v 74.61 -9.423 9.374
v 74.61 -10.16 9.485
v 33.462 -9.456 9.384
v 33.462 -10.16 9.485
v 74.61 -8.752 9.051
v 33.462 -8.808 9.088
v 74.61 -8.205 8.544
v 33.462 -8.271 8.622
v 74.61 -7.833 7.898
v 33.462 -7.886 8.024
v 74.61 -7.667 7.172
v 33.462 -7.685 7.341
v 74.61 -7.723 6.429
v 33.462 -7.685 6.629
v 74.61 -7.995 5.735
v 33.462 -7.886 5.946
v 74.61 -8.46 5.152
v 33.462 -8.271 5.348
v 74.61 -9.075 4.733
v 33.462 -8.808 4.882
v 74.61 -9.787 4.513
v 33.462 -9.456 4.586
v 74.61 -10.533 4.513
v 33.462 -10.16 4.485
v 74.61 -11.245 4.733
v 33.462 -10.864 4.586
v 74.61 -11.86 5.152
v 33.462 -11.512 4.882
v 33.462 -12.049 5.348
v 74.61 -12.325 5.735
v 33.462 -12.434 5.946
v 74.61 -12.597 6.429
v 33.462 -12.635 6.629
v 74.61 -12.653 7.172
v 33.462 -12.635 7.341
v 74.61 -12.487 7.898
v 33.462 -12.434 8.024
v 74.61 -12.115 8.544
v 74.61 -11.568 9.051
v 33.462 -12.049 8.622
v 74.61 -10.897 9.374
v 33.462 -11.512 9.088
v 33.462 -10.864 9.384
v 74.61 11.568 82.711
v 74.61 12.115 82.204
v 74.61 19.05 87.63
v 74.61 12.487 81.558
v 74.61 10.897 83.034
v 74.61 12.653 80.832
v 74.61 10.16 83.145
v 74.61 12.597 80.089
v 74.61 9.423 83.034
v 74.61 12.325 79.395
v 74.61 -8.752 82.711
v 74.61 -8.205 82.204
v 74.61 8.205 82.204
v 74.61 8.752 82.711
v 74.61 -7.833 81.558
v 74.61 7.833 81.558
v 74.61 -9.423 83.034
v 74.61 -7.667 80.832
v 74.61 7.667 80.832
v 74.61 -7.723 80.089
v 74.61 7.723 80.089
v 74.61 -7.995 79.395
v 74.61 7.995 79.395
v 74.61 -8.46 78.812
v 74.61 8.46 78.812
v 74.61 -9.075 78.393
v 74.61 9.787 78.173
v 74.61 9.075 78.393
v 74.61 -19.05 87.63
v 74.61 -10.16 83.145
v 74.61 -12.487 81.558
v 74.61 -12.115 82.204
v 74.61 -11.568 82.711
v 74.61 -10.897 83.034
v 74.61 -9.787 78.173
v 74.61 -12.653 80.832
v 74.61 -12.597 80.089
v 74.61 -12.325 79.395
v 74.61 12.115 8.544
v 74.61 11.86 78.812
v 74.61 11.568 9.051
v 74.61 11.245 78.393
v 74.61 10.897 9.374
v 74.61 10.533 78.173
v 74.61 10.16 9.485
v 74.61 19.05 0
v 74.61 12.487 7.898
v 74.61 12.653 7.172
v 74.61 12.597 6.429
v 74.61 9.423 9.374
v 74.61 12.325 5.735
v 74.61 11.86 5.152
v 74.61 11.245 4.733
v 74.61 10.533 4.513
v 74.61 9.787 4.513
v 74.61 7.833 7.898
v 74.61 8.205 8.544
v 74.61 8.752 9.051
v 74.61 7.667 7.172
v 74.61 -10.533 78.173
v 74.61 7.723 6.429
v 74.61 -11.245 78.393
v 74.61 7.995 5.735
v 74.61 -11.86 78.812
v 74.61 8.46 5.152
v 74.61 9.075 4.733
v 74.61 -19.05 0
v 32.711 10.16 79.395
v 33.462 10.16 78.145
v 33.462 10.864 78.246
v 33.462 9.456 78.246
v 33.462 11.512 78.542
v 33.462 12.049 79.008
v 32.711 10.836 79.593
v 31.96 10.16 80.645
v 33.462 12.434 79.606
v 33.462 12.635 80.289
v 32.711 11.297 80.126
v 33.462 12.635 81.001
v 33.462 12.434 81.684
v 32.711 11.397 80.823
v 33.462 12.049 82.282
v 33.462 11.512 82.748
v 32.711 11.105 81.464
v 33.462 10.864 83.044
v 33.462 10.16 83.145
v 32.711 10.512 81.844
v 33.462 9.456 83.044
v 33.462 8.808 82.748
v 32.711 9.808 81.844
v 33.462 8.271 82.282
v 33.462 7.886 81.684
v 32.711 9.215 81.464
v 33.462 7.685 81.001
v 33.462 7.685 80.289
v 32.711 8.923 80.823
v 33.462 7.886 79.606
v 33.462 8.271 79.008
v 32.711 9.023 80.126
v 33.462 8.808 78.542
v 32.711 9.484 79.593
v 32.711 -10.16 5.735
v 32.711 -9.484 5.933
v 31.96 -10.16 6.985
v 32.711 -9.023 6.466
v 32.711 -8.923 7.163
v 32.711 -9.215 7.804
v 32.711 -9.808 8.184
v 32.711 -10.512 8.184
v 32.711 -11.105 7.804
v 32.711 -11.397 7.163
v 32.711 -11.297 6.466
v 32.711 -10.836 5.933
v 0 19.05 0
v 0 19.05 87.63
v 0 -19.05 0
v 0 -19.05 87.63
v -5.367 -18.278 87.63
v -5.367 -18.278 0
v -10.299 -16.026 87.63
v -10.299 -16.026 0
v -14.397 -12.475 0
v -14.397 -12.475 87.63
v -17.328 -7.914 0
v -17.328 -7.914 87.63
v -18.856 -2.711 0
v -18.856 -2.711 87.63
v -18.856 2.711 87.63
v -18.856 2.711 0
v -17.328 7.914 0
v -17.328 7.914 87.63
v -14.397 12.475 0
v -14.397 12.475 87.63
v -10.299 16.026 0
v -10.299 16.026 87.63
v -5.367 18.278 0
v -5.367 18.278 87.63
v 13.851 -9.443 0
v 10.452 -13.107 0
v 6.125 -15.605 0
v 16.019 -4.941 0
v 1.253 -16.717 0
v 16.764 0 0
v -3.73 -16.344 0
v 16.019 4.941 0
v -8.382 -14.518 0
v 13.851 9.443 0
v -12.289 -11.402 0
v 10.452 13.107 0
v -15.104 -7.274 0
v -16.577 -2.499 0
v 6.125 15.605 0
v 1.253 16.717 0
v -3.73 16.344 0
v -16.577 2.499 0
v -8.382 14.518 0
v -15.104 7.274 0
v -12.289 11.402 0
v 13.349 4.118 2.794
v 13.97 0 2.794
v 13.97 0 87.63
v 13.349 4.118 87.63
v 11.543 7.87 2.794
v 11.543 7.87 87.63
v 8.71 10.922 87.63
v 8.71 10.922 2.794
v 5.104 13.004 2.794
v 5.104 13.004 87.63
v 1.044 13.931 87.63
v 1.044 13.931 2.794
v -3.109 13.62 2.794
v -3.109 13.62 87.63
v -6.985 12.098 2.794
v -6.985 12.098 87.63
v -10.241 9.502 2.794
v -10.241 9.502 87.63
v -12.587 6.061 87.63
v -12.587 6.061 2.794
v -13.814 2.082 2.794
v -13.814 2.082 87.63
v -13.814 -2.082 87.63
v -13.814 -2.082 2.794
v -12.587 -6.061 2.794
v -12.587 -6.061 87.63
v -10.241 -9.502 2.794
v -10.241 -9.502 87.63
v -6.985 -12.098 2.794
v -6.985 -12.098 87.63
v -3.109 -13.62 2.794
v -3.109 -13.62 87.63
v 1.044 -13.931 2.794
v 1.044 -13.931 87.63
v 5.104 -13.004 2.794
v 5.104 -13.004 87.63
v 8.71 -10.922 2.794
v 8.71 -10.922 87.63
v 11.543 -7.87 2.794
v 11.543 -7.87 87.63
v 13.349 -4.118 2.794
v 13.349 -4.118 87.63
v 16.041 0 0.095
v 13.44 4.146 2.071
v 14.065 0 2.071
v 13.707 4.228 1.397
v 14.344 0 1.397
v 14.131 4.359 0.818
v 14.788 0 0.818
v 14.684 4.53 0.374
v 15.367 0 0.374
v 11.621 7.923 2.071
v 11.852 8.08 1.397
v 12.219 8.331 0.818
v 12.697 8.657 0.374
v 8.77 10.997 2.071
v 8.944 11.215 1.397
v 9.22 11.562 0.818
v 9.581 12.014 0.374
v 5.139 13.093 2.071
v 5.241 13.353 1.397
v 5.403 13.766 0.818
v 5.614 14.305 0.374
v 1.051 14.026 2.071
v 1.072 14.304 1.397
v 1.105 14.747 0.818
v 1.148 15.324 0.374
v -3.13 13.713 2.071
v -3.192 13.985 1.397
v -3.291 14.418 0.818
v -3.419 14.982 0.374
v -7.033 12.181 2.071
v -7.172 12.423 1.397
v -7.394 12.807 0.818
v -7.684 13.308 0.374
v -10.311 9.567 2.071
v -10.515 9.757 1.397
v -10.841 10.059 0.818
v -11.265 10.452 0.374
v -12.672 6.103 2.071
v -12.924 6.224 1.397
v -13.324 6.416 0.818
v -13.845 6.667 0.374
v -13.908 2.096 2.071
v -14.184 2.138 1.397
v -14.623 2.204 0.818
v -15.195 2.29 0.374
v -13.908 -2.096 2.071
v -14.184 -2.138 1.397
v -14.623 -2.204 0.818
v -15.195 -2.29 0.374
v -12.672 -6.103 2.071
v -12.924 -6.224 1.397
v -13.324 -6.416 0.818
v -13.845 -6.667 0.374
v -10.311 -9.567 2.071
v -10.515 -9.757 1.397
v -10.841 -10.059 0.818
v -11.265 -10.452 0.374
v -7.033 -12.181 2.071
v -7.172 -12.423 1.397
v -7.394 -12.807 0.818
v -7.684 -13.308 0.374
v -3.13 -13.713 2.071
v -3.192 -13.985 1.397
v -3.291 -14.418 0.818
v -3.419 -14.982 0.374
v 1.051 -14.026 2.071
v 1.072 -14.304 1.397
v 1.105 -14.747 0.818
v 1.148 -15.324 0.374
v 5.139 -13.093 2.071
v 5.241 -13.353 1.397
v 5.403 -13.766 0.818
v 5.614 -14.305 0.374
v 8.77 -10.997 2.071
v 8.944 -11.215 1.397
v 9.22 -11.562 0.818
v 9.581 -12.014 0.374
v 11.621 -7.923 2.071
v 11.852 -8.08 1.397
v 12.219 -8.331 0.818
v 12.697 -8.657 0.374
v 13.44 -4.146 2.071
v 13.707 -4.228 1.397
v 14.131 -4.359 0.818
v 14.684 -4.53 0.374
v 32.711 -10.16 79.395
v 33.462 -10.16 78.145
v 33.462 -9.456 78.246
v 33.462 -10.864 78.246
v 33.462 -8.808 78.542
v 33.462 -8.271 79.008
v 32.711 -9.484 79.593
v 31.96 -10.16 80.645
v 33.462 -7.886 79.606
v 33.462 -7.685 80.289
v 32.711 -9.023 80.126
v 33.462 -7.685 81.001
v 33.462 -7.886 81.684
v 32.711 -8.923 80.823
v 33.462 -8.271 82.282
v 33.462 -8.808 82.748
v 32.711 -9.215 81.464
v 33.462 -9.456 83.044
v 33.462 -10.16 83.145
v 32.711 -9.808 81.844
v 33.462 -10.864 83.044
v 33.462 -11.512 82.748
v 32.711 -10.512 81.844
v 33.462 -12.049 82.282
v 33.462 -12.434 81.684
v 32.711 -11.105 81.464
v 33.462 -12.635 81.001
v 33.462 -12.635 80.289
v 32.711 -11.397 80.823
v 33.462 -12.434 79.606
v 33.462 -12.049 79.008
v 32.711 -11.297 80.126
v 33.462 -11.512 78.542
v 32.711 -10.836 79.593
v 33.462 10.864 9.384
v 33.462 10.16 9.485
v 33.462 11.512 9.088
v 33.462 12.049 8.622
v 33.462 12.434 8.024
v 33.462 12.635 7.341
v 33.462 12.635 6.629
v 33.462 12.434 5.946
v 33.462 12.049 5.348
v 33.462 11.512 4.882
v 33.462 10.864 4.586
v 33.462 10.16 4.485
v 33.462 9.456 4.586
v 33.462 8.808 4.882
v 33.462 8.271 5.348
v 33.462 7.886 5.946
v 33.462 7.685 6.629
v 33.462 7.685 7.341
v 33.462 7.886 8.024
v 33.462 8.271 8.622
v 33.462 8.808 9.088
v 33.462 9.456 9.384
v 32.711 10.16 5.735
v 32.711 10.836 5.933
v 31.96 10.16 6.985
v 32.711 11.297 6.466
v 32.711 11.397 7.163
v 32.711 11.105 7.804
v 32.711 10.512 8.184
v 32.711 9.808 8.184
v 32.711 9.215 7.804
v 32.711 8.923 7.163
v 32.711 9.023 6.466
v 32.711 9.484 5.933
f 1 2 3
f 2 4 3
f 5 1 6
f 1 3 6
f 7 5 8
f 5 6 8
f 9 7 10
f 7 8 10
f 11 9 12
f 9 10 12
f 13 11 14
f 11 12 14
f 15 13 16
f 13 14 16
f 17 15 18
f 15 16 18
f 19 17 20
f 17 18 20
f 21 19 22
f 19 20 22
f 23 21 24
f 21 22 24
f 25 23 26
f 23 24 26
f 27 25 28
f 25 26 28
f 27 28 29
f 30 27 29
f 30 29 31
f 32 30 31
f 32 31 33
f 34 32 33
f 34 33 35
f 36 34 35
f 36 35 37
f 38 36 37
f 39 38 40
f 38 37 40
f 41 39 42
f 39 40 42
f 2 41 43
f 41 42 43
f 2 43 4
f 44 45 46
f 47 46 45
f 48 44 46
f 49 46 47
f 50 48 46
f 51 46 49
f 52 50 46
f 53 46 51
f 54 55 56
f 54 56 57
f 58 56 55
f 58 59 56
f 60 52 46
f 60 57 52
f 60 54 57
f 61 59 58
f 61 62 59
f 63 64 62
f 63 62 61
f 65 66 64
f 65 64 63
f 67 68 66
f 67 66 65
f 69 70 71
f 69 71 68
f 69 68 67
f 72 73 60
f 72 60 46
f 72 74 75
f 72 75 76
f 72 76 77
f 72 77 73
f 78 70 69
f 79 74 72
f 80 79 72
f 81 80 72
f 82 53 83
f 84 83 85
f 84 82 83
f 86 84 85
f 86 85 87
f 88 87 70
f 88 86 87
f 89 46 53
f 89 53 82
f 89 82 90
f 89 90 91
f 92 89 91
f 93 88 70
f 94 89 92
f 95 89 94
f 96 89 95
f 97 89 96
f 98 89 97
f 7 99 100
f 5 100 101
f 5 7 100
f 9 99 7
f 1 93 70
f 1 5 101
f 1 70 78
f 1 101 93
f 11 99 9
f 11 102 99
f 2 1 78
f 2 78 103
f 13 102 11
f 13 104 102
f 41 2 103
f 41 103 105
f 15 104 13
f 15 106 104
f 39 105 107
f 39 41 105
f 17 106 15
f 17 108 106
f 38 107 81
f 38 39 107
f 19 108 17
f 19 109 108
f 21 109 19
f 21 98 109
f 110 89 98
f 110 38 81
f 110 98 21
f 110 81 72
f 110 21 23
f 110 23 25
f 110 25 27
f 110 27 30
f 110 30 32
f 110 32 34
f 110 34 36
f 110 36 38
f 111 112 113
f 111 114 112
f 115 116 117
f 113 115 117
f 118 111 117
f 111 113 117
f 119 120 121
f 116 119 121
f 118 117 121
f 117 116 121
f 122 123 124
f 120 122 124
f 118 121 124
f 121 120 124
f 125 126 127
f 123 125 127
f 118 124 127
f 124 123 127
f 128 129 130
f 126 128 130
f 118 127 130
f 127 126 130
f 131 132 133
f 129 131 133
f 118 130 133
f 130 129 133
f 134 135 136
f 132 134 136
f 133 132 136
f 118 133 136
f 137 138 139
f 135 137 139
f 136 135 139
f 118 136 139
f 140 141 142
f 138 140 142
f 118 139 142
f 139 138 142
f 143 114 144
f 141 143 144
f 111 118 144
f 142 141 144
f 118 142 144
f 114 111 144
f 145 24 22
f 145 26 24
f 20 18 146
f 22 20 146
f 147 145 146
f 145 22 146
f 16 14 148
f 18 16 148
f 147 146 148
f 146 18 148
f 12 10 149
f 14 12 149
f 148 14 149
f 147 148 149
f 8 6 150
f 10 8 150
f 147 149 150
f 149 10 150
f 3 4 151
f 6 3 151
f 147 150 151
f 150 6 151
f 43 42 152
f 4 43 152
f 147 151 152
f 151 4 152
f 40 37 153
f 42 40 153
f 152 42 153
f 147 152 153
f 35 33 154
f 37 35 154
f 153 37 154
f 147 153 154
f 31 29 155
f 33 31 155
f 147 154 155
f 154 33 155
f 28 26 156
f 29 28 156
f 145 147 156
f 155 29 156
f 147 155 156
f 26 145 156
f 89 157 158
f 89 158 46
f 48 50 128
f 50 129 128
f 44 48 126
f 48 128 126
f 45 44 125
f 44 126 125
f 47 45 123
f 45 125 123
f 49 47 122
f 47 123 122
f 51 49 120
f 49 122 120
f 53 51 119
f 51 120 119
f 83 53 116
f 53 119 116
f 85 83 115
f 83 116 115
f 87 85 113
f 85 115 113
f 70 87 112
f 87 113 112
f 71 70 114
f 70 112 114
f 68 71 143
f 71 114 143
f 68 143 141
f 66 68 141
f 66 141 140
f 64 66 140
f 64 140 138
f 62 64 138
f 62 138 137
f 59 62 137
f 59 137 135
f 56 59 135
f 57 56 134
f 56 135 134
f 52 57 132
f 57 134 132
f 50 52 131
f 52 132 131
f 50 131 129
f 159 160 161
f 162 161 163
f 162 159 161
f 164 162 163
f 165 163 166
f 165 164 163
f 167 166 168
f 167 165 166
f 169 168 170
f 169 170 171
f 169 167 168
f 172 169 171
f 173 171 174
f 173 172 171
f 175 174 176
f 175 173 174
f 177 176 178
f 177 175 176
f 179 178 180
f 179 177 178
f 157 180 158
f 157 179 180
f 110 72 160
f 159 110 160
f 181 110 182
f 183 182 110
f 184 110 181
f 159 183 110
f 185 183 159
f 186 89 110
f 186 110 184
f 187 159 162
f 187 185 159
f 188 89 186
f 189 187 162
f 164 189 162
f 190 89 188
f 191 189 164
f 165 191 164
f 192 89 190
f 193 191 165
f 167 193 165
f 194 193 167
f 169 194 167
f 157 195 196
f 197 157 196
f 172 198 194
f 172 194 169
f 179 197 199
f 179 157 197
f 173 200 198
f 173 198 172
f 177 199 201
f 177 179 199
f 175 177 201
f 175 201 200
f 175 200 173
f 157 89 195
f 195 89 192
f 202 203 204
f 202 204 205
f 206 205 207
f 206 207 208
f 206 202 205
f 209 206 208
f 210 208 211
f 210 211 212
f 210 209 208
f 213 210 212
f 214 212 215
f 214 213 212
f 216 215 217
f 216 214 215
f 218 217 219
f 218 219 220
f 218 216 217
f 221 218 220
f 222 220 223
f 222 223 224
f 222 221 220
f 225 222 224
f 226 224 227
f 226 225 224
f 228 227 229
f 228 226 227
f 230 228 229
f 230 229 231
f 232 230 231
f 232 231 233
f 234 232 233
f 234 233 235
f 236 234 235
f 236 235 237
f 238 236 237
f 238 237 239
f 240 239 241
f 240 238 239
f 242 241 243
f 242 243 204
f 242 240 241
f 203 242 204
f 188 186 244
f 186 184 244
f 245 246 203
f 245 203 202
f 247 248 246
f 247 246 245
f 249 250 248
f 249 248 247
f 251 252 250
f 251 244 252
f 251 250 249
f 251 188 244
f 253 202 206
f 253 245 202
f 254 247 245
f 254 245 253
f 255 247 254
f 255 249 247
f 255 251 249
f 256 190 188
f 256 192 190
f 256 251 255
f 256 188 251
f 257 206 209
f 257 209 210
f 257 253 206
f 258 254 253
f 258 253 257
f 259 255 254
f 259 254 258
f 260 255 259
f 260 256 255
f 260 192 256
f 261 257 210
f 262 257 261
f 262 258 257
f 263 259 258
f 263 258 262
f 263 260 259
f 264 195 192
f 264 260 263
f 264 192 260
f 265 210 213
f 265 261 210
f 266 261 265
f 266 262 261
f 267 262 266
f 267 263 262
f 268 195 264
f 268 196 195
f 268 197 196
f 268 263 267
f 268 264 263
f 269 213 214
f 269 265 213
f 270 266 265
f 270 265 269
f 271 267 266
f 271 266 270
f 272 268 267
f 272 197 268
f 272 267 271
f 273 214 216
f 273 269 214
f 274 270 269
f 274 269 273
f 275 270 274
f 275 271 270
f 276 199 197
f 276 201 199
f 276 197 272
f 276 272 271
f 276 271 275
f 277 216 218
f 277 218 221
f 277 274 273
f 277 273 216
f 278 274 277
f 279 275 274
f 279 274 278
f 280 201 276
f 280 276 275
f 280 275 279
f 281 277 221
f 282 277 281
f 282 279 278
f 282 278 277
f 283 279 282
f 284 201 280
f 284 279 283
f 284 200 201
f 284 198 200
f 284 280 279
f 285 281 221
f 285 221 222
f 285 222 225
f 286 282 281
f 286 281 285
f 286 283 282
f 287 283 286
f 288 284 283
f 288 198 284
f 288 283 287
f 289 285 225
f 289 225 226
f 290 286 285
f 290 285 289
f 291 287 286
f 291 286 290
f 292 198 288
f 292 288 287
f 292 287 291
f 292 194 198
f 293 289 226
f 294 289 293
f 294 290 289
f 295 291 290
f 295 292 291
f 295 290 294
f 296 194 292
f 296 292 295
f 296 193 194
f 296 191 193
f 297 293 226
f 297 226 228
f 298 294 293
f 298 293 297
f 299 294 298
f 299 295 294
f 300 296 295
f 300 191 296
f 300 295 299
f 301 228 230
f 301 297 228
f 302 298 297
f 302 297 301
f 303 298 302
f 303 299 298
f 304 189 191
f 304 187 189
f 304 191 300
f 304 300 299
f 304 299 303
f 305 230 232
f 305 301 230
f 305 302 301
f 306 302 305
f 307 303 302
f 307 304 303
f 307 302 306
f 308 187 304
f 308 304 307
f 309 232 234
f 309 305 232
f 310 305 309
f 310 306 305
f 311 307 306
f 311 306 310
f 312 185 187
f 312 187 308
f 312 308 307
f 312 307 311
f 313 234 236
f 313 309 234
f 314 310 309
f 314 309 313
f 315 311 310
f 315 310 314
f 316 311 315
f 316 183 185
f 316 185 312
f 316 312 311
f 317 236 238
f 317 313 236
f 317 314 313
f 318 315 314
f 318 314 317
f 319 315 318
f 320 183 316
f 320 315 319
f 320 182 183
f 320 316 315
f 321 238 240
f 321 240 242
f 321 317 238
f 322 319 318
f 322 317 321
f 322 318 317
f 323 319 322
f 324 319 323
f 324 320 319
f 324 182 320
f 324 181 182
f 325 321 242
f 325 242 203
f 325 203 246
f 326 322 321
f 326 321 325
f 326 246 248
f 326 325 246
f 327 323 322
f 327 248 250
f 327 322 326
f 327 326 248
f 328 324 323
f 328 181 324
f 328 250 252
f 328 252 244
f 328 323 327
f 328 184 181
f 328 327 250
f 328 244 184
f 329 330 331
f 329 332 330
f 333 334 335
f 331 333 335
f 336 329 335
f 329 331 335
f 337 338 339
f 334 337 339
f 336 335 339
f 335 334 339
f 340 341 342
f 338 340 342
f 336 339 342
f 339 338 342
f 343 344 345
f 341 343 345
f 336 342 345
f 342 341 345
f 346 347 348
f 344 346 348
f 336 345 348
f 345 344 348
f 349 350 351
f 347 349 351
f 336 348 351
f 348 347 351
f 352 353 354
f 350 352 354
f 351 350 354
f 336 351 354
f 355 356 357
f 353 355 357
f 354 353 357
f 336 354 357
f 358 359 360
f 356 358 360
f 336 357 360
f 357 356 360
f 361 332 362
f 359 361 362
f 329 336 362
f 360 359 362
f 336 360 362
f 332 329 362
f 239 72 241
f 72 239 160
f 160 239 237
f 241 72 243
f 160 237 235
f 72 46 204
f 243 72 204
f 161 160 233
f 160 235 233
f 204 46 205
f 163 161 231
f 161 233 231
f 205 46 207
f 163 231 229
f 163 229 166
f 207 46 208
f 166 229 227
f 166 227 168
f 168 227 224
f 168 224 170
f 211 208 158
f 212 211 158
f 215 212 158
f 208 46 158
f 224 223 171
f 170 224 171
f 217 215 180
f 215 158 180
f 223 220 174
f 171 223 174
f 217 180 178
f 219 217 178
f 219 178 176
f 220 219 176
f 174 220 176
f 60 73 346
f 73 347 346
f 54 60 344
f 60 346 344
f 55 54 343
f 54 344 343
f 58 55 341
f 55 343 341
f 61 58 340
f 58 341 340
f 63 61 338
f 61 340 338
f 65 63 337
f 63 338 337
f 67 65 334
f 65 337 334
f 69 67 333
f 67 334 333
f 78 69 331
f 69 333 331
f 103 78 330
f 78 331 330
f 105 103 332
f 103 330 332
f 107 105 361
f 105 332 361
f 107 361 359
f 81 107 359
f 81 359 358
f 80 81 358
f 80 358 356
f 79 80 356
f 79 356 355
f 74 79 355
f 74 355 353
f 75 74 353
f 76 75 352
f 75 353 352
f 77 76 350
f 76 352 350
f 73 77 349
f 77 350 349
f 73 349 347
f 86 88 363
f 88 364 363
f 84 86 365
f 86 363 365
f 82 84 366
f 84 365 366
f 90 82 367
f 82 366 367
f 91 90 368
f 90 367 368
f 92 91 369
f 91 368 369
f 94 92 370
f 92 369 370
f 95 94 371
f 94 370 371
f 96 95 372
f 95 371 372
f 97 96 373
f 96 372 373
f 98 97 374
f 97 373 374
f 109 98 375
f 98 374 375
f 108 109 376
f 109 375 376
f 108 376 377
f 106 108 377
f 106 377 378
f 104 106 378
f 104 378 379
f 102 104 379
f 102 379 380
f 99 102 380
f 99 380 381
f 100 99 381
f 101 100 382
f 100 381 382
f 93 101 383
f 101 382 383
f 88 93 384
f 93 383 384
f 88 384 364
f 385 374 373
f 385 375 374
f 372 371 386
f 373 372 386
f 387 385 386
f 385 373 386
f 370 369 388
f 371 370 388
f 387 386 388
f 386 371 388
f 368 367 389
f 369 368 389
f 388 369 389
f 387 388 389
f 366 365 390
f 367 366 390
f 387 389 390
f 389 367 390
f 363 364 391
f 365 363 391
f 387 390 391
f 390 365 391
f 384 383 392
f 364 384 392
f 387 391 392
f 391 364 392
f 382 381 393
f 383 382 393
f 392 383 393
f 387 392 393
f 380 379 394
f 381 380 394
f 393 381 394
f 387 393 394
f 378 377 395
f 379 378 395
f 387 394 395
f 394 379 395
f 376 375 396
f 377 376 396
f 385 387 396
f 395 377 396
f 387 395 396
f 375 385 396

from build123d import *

# Parameters (mm, degrees)
SKETCH1_R                 = 13.97
BOSS_EXTRUDE1_DEPTH       = 87.63
FILLET3_R                 = 2.794
M6X1_0_TAPPED_HOLE1_D     = 5
M6X1_0_TAPPED_HOLE1_DEPTH = 41.148
M6X1_0_TAPPED_HOLE1_TIP   = 1.502151548


with BuildPart() as part:
    # Sketch1 → Boss-Extrude1 (new body)
    with BuildSketch(Plane.XY):
        with BuildLine():
            Line((0, 19.05), (74.609999878, 19.05))
            Line((74.609999878, 19.05), (74.609999878, -19.05))
            Line((74.609999878, -19.05), (0, -19.05))
            ThreePointArc((0, -19.05), (-19.05, 0), (0, 19.05))
        make_face()
        Circle(SKETCH1_R, mode=Mode.SUBTRACT)
    extrude(amount=BOSS_EXTRUDE1_DEPTH)

    # Fillet3
    fillet3_edges = [part.edges().sort_by_distance(p)[0] for p in [
        (-13.97, 0, 0),
    ]]
    fillet(fillet3_edges, radius=FILLET3_R)

    # M6x1.0 Tapped Hole1
    with Locations(Plane(origin=(74.609999878, 0, 0), x_dir=(0, 0, -1), z_dir=(1, 0, 0))):
        with Locations((-80.645, -10.16), (-80.645, 10.16), (-6.985, 10.16), (-6.985, -10.16)):
            Hole(M6X1_0_TAPPED_HOLE1_D / 2, depth=M6X1_0_TAPPED_HOLE1_DEPTH)
            with Locations((0, 0, -(M6X1_0_TAPPED_HOLE1_DEPTH + M6X1_0_TAPPED_HOLE1_TIP / 2))):  # 118° drill point
                Cone(0, M6X1_0_TAPPED_HOLE1_D / 2, M6X1_0_TAPPED_HOLE1_TIP, mode=Mode.SUBTRACT)


solid = part.part
